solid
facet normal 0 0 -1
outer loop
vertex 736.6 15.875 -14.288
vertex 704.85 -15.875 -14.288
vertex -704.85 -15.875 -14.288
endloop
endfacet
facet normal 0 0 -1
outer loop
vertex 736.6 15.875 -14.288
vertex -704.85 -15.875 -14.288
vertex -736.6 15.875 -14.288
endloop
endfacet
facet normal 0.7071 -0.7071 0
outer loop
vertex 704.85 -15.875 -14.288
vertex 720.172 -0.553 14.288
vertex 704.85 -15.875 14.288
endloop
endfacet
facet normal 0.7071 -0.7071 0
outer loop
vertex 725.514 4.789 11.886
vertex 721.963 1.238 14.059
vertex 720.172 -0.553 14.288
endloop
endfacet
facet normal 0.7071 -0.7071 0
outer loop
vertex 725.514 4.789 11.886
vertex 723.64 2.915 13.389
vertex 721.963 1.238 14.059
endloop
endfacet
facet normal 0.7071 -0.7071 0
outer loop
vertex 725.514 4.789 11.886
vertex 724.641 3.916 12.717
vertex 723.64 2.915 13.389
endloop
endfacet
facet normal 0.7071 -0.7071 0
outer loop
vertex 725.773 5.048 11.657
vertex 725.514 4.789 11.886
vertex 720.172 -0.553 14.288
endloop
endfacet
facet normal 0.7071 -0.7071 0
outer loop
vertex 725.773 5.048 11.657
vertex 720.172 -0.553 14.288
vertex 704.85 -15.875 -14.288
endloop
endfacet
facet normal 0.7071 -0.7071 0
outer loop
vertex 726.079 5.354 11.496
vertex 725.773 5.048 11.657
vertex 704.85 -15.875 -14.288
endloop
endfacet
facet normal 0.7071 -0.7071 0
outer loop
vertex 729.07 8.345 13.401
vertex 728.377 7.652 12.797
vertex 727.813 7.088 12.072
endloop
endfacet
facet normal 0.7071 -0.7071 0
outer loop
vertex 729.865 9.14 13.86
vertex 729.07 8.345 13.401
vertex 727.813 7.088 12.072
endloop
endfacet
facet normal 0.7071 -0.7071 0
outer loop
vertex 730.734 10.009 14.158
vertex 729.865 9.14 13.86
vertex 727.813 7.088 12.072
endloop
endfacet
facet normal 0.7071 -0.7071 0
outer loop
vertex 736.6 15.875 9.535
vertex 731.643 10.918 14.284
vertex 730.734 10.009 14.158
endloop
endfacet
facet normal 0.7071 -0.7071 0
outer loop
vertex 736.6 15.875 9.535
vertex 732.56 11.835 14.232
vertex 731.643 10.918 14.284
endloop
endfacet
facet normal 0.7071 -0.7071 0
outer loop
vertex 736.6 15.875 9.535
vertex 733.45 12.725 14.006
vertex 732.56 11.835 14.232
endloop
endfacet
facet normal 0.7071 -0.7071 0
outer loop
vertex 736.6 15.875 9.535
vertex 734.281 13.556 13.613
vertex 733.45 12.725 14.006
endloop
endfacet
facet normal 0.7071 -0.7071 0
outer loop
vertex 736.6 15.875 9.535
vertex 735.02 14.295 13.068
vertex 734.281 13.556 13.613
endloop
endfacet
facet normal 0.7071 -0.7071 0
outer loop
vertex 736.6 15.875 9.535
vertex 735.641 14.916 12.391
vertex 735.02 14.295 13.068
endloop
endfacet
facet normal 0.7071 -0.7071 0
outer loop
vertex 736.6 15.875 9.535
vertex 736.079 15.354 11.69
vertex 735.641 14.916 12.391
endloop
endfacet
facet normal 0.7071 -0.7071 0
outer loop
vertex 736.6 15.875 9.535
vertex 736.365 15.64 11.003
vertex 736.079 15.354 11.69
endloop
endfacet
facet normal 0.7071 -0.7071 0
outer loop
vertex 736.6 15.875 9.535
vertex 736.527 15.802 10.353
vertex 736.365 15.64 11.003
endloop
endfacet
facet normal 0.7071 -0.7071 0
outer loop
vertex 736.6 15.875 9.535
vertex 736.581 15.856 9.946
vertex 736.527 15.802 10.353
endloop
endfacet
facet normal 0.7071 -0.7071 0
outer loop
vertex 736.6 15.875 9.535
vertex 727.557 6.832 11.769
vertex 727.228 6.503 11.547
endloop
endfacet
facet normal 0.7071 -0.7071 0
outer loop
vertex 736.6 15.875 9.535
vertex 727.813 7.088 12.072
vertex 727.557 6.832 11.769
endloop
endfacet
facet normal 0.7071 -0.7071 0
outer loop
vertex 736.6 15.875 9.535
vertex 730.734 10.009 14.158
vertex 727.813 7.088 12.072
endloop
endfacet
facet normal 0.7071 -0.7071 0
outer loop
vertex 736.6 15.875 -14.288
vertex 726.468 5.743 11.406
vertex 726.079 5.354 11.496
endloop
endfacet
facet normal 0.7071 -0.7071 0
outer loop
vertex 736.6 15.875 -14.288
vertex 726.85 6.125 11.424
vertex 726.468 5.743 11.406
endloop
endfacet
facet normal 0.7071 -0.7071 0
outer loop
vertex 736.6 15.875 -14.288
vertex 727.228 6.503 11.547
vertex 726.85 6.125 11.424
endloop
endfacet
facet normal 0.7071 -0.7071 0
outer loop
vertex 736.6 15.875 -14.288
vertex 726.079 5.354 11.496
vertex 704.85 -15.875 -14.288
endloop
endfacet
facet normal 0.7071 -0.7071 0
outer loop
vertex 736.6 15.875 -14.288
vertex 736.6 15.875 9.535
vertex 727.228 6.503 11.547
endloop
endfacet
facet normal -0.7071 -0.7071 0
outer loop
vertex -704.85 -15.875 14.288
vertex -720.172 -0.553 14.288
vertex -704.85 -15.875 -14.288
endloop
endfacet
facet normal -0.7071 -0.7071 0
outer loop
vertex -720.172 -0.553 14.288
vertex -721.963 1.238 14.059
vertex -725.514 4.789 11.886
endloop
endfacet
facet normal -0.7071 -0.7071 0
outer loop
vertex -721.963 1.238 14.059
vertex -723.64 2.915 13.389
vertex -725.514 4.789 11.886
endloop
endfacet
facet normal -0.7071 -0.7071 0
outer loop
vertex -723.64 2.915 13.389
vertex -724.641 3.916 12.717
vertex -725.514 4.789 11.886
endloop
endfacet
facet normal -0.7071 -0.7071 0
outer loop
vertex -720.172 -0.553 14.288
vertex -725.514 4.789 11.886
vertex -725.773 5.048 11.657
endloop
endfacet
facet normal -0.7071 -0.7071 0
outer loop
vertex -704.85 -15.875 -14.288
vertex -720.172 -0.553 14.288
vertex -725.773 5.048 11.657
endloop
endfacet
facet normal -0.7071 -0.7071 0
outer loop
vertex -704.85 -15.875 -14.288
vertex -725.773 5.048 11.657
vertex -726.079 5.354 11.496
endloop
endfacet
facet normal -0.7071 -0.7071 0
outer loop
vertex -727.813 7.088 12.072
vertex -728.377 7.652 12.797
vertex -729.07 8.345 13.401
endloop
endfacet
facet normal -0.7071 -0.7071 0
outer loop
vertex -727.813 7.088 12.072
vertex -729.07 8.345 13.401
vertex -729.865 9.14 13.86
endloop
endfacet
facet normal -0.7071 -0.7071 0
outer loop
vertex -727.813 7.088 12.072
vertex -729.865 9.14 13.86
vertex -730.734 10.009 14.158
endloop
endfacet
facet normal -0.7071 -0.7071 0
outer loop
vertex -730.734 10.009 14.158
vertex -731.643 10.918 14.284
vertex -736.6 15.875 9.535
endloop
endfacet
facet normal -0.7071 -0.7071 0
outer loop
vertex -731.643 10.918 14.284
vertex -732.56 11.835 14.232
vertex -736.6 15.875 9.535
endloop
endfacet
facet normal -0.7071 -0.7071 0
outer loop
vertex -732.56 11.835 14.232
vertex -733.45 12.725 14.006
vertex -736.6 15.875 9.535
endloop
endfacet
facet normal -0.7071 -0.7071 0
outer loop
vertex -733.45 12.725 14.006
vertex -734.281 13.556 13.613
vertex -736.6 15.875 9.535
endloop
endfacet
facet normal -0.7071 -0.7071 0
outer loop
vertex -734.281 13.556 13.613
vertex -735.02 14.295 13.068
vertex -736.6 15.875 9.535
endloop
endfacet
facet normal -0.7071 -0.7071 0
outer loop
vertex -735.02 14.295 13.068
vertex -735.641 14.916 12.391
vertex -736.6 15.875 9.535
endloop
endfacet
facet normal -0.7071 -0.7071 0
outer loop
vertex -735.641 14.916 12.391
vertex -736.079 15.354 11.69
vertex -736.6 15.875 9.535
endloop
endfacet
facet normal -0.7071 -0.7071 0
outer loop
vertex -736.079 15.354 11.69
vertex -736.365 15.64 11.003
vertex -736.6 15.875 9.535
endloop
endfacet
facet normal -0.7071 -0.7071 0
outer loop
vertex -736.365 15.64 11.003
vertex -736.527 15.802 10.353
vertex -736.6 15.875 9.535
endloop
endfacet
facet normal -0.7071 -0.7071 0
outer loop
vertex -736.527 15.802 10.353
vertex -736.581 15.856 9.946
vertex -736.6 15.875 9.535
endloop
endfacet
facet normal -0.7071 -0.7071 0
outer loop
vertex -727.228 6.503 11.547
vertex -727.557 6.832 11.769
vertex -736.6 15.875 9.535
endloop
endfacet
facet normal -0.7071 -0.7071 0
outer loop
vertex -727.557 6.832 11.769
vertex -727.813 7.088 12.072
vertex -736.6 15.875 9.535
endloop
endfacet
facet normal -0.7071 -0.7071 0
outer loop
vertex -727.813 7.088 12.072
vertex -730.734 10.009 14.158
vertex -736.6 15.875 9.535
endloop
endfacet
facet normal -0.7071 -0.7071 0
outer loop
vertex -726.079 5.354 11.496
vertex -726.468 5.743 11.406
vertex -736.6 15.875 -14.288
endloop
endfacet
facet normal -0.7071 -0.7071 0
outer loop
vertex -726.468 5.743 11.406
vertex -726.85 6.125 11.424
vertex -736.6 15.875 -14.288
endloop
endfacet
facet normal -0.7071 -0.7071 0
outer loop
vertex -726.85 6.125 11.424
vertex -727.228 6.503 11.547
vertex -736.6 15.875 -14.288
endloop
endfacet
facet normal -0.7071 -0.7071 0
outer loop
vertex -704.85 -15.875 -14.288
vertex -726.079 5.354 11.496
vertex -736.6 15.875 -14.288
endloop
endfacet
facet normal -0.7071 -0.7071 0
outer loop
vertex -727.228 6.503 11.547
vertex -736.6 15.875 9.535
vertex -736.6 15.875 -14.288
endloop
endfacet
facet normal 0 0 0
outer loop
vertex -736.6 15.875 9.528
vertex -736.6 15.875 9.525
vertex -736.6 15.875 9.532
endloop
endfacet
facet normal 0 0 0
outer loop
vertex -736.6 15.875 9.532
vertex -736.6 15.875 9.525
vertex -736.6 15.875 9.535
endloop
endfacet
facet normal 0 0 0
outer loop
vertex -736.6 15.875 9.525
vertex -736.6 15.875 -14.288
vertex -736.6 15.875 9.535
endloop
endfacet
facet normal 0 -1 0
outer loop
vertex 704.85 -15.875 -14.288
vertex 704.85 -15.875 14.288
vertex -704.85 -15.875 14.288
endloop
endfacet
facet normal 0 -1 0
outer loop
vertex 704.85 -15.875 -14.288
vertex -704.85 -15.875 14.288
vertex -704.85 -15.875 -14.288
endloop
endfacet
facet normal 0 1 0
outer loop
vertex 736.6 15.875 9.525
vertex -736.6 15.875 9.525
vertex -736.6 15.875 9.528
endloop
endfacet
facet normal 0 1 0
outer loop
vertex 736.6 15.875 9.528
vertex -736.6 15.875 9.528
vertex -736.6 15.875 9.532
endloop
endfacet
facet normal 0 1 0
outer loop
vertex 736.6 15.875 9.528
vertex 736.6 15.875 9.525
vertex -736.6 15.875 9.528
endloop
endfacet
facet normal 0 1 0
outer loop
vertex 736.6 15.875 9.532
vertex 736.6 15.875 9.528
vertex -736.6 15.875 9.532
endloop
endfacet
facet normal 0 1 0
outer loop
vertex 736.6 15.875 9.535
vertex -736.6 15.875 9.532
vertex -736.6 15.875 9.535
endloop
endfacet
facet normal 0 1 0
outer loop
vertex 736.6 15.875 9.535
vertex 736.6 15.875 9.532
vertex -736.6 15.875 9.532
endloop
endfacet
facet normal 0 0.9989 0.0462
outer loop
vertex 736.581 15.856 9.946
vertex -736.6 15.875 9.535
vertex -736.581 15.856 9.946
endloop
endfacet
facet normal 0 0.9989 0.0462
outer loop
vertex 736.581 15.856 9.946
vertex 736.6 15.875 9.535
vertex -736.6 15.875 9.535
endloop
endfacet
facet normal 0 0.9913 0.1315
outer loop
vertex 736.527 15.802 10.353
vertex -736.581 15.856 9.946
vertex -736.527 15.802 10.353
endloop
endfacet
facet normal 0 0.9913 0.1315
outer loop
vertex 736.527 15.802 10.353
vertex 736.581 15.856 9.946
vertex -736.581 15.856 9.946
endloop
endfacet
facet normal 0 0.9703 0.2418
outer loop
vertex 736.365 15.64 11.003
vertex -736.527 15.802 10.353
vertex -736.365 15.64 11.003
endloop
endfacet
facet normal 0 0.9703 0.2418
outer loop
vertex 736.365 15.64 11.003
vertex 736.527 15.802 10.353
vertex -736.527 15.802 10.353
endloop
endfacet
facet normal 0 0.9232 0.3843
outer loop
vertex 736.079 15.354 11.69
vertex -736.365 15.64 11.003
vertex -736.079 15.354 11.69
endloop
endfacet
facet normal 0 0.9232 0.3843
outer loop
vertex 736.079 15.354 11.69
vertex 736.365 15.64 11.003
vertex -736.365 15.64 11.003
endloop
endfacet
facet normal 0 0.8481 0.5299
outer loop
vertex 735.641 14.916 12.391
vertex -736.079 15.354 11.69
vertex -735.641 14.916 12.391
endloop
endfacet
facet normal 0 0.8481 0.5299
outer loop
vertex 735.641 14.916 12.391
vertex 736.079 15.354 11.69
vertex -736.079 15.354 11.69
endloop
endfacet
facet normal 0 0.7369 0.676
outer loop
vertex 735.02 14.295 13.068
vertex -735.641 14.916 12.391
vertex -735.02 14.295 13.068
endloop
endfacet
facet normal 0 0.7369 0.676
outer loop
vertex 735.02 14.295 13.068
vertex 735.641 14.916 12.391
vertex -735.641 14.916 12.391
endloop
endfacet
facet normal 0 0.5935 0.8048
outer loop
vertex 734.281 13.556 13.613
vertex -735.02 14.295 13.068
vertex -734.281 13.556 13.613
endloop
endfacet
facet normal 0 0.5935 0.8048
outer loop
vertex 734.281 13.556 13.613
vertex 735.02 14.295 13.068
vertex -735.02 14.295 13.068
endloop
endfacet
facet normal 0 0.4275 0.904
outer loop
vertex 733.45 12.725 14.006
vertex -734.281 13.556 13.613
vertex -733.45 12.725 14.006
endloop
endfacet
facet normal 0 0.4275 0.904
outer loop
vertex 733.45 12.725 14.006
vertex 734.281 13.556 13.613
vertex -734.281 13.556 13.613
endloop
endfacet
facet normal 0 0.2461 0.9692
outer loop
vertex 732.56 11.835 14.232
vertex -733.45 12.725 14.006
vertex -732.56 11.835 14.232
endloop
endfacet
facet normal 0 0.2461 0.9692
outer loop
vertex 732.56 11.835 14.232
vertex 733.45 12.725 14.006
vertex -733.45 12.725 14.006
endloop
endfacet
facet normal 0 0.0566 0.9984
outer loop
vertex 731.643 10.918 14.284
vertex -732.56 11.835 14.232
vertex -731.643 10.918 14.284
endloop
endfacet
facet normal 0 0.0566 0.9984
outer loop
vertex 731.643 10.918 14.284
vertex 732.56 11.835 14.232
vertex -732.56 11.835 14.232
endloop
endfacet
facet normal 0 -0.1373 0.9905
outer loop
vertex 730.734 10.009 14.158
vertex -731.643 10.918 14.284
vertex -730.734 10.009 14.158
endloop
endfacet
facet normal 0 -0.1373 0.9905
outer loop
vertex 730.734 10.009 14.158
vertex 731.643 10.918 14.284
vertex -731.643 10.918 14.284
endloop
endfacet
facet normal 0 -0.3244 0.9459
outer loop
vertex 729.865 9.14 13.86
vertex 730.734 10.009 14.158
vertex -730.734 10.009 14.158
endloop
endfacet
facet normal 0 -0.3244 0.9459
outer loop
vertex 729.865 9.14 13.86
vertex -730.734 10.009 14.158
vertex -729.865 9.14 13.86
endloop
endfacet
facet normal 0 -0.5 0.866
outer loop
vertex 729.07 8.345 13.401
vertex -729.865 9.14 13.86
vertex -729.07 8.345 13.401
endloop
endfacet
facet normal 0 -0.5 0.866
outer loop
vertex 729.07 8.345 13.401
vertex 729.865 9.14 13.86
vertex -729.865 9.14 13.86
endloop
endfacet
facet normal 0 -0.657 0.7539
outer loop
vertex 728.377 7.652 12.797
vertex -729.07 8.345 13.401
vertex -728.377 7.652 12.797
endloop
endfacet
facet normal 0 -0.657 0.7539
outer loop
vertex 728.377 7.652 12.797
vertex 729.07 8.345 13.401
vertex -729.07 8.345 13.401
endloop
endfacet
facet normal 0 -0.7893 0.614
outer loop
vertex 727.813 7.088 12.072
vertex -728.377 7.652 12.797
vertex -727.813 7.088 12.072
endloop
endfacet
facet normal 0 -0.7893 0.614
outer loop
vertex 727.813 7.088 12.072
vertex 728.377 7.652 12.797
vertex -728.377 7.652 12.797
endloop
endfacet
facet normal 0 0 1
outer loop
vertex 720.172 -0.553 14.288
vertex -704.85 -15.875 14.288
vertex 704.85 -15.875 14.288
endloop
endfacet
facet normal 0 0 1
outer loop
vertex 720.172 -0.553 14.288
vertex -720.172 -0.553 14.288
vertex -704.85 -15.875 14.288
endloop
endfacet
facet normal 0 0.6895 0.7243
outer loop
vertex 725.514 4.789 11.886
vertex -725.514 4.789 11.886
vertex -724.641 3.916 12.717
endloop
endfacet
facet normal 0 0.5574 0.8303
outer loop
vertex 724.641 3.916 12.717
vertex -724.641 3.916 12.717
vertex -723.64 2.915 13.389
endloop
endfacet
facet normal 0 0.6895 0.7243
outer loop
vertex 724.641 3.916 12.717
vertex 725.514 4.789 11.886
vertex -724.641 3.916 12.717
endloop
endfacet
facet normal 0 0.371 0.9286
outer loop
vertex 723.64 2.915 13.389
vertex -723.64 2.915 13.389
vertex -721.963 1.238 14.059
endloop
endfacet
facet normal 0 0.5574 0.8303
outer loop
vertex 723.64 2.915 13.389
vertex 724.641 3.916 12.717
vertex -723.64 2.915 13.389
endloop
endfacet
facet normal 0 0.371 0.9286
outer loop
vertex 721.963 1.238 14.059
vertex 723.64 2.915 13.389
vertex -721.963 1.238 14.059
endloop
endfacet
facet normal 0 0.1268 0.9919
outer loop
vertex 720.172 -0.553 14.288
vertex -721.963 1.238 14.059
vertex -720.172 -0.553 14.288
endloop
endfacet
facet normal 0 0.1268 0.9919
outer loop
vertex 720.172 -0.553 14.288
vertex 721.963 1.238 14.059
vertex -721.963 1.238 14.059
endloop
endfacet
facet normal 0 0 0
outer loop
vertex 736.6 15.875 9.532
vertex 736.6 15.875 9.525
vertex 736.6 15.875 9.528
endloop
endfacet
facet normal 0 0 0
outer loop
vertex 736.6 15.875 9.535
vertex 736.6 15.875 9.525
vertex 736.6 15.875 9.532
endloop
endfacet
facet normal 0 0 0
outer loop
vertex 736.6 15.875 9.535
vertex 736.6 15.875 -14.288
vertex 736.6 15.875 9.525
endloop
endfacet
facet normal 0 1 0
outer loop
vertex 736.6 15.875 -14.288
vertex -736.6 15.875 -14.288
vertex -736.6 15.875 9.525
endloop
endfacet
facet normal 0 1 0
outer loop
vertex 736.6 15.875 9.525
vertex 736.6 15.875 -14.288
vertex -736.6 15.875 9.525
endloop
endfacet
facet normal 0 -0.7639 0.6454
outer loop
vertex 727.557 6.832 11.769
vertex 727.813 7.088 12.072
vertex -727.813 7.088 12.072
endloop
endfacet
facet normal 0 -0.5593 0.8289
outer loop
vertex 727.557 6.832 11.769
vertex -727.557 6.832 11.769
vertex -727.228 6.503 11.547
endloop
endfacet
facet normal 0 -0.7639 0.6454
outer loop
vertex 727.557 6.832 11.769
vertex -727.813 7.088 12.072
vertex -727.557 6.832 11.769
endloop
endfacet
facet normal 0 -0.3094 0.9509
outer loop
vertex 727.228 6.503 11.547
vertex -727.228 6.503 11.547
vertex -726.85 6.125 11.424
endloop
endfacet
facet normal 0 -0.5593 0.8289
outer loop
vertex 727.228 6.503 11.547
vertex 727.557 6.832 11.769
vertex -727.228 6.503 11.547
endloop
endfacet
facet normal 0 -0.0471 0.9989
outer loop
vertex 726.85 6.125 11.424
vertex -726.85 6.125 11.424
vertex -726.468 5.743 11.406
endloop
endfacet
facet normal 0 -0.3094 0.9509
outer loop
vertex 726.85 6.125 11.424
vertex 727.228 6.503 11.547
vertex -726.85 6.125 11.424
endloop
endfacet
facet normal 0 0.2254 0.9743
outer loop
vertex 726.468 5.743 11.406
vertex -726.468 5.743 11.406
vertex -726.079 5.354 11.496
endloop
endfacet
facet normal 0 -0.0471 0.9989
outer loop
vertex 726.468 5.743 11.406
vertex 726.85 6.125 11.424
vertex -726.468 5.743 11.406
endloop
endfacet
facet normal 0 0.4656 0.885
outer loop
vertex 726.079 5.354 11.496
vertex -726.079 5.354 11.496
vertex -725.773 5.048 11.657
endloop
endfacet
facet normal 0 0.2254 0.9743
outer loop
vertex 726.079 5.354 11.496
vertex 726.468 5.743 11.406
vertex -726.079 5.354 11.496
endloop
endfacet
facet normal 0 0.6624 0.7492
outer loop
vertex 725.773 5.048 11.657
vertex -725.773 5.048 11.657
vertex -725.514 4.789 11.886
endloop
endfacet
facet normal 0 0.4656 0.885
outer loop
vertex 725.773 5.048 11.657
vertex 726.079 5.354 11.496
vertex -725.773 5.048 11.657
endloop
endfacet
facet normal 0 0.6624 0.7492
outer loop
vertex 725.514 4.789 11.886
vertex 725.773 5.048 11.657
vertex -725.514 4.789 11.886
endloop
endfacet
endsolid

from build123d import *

# Parameters (mm, degrees)
F1_DEPTH = 736.6
F2_SIZE  = 31.74999


# Not quite as in the source:
# - a fillet or chamfer is up to 0.001 mm smaller than in the source, because OpenCascade refuses the exact size


with BuildPart() as f1:
    # F0 (on Right) → F1 (new body, symmetric)
    with BuildSketch(Plane.YZ):
        with BuildLine():
            Line((-15.875, -14.2875), (15.875, -14.2875))
            Line((15.875, -14.2875), (15.875, 9.525))
            ThreePointArc((15.875, 9.525), (12.4385421004, 14.0991686237), (7.08843051, 12.07220847))
            ThreePointArc((7.08843051, 12.07220847), (5.9853917743, 11.4055483551), (4.789455264, 11.886033552))
            ThreePointArc((4.789455264, 11.886033552), (2.3755826554, 13.6595328458), (-0.5531949, 14.2875))
            Line((-0.5531949, 14.2875), (-15.875, 14.2875))
            Line((-15.875, 14.2875), (-15.875, -14.2875))
        make_face()
    extrude(amount=F1_DEPTH, both=True)

    # F2 (size 31.75 in the source; OpenCascade refuses exactly that, so slightly less here)
    f2_edges = [f1.edges().sort_by_distance(p)[0] for p in [
        (-736.6, -15.875, 0),
        (736.6, -15.875, 0),
    ]]
    chamfer(f2_edges, length=F2_SIZE)


solid = f1.part
